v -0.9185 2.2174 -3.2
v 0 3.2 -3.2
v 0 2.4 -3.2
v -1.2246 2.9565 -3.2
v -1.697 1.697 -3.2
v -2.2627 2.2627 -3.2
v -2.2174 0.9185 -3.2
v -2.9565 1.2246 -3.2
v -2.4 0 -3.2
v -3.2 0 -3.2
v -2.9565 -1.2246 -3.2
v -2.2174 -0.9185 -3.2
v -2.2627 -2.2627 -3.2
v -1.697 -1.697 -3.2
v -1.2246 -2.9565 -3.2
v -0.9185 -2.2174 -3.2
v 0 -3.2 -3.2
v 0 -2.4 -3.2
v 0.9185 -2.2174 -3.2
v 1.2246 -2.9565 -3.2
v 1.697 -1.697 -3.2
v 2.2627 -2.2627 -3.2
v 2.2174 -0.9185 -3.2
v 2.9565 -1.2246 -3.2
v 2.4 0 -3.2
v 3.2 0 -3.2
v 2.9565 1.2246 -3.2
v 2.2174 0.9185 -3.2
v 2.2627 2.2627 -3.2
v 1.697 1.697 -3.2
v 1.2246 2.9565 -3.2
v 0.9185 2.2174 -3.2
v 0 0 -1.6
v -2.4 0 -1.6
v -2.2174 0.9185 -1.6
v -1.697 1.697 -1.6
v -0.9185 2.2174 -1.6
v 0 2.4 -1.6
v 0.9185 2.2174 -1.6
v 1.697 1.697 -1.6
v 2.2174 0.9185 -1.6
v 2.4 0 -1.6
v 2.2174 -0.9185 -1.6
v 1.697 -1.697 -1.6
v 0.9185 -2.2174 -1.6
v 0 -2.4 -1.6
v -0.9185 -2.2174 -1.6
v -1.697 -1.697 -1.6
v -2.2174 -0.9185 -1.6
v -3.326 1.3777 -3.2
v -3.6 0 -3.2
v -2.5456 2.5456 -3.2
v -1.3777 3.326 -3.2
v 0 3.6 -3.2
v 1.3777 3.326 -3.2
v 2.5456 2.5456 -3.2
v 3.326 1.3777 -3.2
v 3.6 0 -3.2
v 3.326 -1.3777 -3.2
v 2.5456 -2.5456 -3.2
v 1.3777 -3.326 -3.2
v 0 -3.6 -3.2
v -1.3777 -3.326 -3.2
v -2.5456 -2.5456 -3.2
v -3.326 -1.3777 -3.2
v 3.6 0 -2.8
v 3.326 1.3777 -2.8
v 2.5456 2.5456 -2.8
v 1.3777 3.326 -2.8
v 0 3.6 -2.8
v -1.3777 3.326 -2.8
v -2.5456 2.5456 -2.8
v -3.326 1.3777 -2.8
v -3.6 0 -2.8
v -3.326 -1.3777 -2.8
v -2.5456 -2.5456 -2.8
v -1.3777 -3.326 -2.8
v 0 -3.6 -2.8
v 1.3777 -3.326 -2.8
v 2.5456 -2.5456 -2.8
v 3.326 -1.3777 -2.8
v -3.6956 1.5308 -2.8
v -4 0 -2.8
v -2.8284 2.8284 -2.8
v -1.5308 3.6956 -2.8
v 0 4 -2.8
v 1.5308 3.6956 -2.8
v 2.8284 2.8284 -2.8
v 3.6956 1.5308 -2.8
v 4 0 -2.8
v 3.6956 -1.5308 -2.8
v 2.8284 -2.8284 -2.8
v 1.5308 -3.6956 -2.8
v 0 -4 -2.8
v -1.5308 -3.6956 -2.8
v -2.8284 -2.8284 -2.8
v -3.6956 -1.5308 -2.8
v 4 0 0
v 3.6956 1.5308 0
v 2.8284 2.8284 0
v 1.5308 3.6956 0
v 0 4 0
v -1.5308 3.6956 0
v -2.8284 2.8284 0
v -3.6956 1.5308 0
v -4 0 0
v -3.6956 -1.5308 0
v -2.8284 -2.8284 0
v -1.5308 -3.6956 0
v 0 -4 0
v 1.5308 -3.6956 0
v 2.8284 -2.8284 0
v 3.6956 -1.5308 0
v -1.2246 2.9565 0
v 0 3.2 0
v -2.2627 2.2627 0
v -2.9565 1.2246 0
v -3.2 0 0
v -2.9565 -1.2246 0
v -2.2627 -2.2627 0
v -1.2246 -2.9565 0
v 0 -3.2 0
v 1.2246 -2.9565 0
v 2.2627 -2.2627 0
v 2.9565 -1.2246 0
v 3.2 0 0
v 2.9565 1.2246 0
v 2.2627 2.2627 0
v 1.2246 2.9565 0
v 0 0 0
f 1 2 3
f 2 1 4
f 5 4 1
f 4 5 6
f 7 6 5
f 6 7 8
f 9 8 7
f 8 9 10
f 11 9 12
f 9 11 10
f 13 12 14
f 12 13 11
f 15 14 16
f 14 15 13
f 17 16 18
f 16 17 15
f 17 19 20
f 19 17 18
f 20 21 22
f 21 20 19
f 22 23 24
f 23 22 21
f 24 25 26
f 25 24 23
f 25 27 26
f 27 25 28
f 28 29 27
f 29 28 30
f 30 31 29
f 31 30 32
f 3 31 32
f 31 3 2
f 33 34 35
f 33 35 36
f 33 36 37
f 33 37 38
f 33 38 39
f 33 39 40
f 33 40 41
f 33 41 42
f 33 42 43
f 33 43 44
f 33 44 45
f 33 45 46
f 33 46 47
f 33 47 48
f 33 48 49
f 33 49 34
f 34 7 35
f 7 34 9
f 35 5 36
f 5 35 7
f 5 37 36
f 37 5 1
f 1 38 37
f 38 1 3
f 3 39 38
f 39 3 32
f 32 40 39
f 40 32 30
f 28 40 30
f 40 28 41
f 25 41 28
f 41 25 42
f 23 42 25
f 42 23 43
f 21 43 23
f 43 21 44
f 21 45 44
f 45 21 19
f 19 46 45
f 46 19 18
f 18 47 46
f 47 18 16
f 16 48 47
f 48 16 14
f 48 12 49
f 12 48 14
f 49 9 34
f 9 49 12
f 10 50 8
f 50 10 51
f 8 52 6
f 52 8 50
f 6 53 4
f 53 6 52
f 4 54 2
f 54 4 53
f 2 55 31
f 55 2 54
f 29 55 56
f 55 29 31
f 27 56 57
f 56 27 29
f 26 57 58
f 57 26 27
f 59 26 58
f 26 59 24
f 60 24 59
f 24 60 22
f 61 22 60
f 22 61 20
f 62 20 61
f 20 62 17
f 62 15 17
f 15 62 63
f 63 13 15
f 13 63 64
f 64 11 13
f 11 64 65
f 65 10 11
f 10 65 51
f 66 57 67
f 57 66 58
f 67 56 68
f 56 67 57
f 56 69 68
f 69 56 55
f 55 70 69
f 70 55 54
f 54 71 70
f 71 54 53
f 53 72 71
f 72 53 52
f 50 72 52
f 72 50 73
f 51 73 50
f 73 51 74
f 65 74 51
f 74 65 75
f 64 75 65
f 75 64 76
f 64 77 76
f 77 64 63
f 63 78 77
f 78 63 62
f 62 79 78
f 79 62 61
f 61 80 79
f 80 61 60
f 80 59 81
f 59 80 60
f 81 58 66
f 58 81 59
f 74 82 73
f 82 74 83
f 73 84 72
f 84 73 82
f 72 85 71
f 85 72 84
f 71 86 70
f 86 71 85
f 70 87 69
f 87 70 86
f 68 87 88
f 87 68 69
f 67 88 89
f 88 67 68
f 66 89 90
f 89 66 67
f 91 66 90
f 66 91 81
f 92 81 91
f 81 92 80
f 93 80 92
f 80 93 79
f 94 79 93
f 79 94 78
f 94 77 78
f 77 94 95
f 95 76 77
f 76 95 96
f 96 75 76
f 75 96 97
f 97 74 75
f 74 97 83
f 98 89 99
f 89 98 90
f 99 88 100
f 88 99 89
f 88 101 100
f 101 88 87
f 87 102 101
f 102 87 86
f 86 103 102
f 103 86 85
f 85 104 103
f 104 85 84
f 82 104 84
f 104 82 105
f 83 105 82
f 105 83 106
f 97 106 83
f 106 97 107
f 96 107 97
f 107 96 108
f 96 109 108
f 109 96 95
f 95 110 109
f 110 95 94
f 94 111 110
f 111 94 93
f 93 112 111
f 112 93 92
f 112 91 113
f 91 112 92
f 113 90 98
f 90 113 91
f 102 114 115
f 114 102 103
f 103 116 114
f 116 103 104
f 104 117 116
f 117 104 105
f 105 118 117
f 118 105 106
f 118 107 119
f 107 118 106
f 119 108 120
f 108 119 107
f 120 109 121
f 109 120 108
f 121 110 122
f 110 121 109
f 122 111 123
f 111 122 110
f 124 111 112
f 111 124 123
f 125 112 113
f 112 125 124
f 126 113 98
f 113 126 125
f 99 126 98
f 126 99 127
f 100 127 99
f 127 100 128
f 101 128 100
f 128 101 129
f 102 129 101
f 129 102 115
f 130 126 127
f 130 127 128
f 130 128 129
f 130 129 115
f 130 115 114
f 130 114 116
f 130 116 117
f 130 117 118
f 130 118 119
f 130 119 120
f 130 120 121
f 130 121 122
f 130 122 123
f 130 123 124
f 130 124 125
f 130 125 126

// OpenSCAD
// file: ../p/4-4ring3.scad
use <../lib.scad>
function ldraw_lib__4_4ring3() = [
// 0 Ring  3 x 1.0
// 0 Name: 4-4ring3.dat
// 0 Author: James Jessiman
// 0 !LDRAW_ORG Primitive UPDATE 2009-01
// 0 !LICENSE Licensed under CC BY 2.0 and CC BY 4.0 : see CAreadme.txt
// 
// 0 BFC CERTIFY CCW
  [0,"BFC","CERTIFY"],
  [0,"BFC","CCW"],
// 
// 0 !HISTORY 1998-12-15 [PTadmin] Official Update 1998-10
// 0 !HISTORY 2002-04-05 [hafhead] Added BFC statement
// 0 !HISTORY 2002-04-25 [PTadmin] Official Update 2002-02
// 0 !HISTORY 2007-06-24 [PTadmin] Header formatted for Contributor Agreement
// 0 !HISTORY 2008-07-01 [PTadmin] Official Update 2008-01
// 0 !HISTORY 2008-08-26 [cwdee] Switch polygon winding and rename
// 0 !HISTORY 2009-05-02 [PTadmin] Official Update 2009-01
// 
// 
// 4 16 -1.5308 0 3.6956 -1.1481 0 2.7717 0 0 3 0 0 4
  [4,16,-1.5308,0,3.6956,-1.1481,0,2.7717,0,0,3,0,0,4],
// 4 16 -2.8284 0 2.8284 -2.1213 0 2.1213 -1.1481 0 2.7717 -1.5308 0 3.6956
  [4,16,-2.8284,0,2.8284,-2.1213,0,2.1213,-1.1481,0,2.7717,-1.5308,0,3.6956],
// 4 16 -3.6956 0 1.5308 -2.7717 0 1.1481 -2.1213 0 2.1213 -2.8284 0 2.8284
  [4,16,-3.6956,0,1.5308,-2.7717,0,1.1481,-2.1213,0,2.1213,-2.8284,0,2.8284],
// 4 16 -4 0 0 -3 0 0 -2.7717 0 1.1481 -3.6956 0 1.5308
  [4,16,-4,0,0,-3,0,0,-2.7717,0,1.1481,-3.6956,0,1.5308],
// 4 16 -3.6956 0 -1.5308 -2.7717 0 -1.1481 -3 0 0 -4 0 0
  [4,16,-3.6956,0,-1.5308,-2.7717,0,-1.1481,-3,0,0,-4,0,0],
// 4 16 -2.8284 0 -2.8284 -2.1213 0 -2.1213 -2.7717 0 -1.1481 -3.6956 0 -1.5308
  [4,16,-2.8284,0,-2.8284,-2.1213,0,-2.1213,-2.7717,0,-1.1481,-3.6956,0,-1.5308],
// 4 16 -1.5308 0 -3.6956 -1.1481 0 -2.7717 -2.1213 0 -2.1213 -2.8284 0 -2.8284
  [4,16,-1.5308,0,-3.6956,-1.1481,0,-2.7717,-2.1213,0,-2.1213,-2.8284,0,-2.8284],
// 4 16 0 0 -4 0 0 -3 -1.1481 0 -2.7717 -1.5308 0 -3.6956
  [4,16,0,0,-4,0,0,-3,-1.1481,0,-2.7717,-1.5308,0,-3.6956],
// 4 16 1.5308 0 -3.6956 1.1481 0 -2.7717 0 0 -3 0 0 -4
  [4,16,1.5308,0,-3.6956,1.1481,0,-2.7717,0,0,-3,0,0,-4],
// 4 16 2.8284 0 -2.8284 2.1213 0 -2.1213 1.1481 0 -2.7717 1.5308 0 -3.6956
  [4,16,2.8284,0,-2.8284,2.1213,0,-2.1213,1.1481,0,-2.7717,1.5308,0,-3.6956],
// 4 16 3.6956 0 -1.5308 2.7717 0 -1.1481 2.1213 0 -2.1213 2.8284 0 -2.8284
  [4,16,3.6956,0,-1.5308,2.7717,0,-1.1481,2.1213,0,-2.1213,2.8284,0,-2.8284],
// 4 16 4 0 0 3 0 0 2.7717 0 -1.1481 3.6956 0 -1.5308
  [4,16,4,0,0,3,0,0,2.7717,0,-1.1481,3.6956,0,-1.5308],
// 4 16 3.6956 0 1.5308 2.7717 0 1.1481 3 0 0 4 0 0
  [4,16,3.6956,0,1.5308,2.7717,0,1.1481,3,0,0,4,0,0],
// 4 16 2.8284 0 2.8284 2.1213 0 2.1213 2.7717 0 1.1481 3.6956 0 1.5308
  [4,16,2.8284,0,2.8284,2.1213,0,2.1213,2.7717,0,1.1481,3.6956,0,1.5308],
// 4 16 1.5308 0 3.6956 1.1481 0 2.7717 2.1213 0 2.1213 2.8284 0 2.8284
  [4,16,1.5308,0,3.6956,1.1481,0,2.7717,2.1213,0,2.1213,2.8284,0,2.8284],
// 4 16 0 0 4 0 0 3 1.1481 0 2.7717 1.5308 0 3.6956
  [4,16,0,0,4,0,0,3,1.1481,0,2.7717,1.5308,0,3.6956],
// 0
];
module ldraw_lib__4_4ring3(step=0, col=false, unit=2/5, alt=false, line=0.2, solid=!$preview)
    makepoly(ldraw_lib__4_4ring3(), step=step, col=col, unit=unit, alt=alt, line=line, solid=solid);
ldraw_lib__4_4ring3(line=0.2);
// file: ../p/4-4cylc.scad
use <../lib.scad>
use <4-4cyli.scad>
use <4-4disc.scad>
use <4-4edge.scad>
function ldraw_lib__4_4cylc() = [
// 0 Cylinder Closed 1.0
// 0 Name: 4-4cylc.dat
// 0 Author: Alex Taylor [anathema]
// 0 !LDRAW_ORG Primitive UPDATE 2009-02
// 0 !LICENSE Licensed under CC BY 2.0 and CC BY 4.0 : see CAreadme.txt
// 
// 0 BFC CERTIFY CCW
  [0,"BFC","CERTIFY"],
  [0,"BFC","CCW"],
// 
// 0 !HISTORY 2008-12-29 [cwdee] Removed one disc
// 0 !HISTORY 2009-09-03 [PTadmin] Official Update 2009-02
// 
// 
// 1 16 0 0 0 1 0 0 0 1 0 0 0 1 4-4edge.dat
  [1,16,0,0,0,1,0,0,0,1,0,0,0,1, ldraw_lib__4_4edge()],
// 1 16 0 1 0 1 0 0 0 1 0 0 0 1 4-4edge.dat
  [1,16,0,1,0,1,0,0,0,1,0,0,0,1, ldraw_lib__4_4edge()],
// 1 16 0 0 0 1 0 0 0 1 0 0 0 1 4-4disc.dat
  [1,16,0,0,0,1,0,0,0,1,0,0,0,1, ldraw_lib__4_4disc()],
// 1 16 0 0 0 1 0 0 0 1 0 0 0 1 4-4cyli.dat
  [1,16,0,0,0,1,0,0,0,1,0,0,0,1, ldraw_lib__4_4cyli()],
// 0
];
module ldraw_lib__4_4cylc(step=0, col=false, unit=2/5, alt=false, line=0.2, solid=!$preview)
    makepoly(ldraw_lib__4_4cylc(), step=step, col=col, unit=unit, alt=alt, line=line, solid=solid);
ldraw_lib__4_4cylc(line=0.2);
// file: ../p/4-4edge.scad
use <../lib.scad>
function ldraw_lib__4_4edge() = [
// 0 Circle 1.0
// 0 Name: 4-4edge.dat
// 0 Author: James Jessiman
// 0 !LDRAW_ORG Primitive UPDATE 2017-01
// 0 !LICENSE Licensed under CC BY 4.0 : see CAreadme.txt
// 
// 0 BFC CERTIFY CCW
  [0,"BFC","CERTIFY"],
  [0,"BFC","CCW"],
// 
// 0 !HISTORY 1998-12-15 [PTadmin] Official Update 1998-10
// 0 !HISTORY 2005-12-28 [PTadmin] Official Update 2005-01
// 0 !HISTORY 2007-06-24 [PTadmin] Header formatted for Contributor Agreement
// 0 !HISTORY 2008-07-01 [PTadmin] Official Update 2008-01
// 0 !HISTORY 2017-01-15 [Steffen] BFCed
// 0 !HISTORY 2017-12-30 [PTadmin] Official Update 2017-01
// 
// 
// 2 24 1 0 0 0.9239 0 0.3827
  [2,24,1,0,0,0.9239,0,0.3827],
// 2 24 0.9239 0 0.3827 0.7071 0 0.7071
  [2,24,0.9239,0,0.3827,0.7071,0,0.7071],
// 2 24 0.7071 0 0.7071 0.3827 0 0.9239
  [2,24,0.7071,0,0.7071,0.3827,0,0.9239],
// 2 24 0.3827 0 0.9239 0 0 1
  [2,24,0.3827,0,0.9239,0,0,1],
// 2 24 0 0 1 -0.3827 0 0.9239
  [2,24,0,0,1,-0.3827,0,0.9239],
// 2 24 -0.3827 0 0.9239 -0.7071 0 0.7071
  [2,24,-0.3827,0,0.9239,-0.7071,0,0.7071],
// 2 24 -0.7071 0 0.7071 -0.9239 0 0.3827
  [2,24,-0.7071,0,0.7071,-0.9239,0,0.3827],
// 2 24 -0.9239 0 0.3827 -1 0 -0
  [2,24,-0.9239,0,0.3827,-1,0,-0],
// 2 24 -1 0 -0 -0.9239 0 -0.3827
  [2,24,-1,0,-0,-0.9239,0,-0.3827],
// 2 24 -0.9239 0 -0.3827 -0.7071 0 -0.7071
  [2,24,-0.9239,0,-0.3827,-0.7071,0,-0.7071],
// 2 24 -0.7071 0 -0.7071 -0.3827 0 -0.9239
  [2,24,-0.7071,0,-0.7071,-0.3827,0,-0.9239],
// 2 24 -0.3827 0 -0.9239 0 0 -1
  [2,24,-0.3827,0,-0.9239,0,0,-1],
// 2 24 0 0 -1 0.3827 0 -0.9239
  [2,24,0,0,-1,0.3827,0,-0.9239],
// 2 24 0.3827 0 -0.9239 0.7071 0 -0.7071
  [2,24,0.3827,0,-0.9239,0.7071,0,-0.7071],
// 2 24 0.7071 0 -0.7071 0.9239 0 -0.3827
  [2,24,0.7071,0,-0.7071,0.9239,0,-0.3827],
// 2 24 0.9239 0 -0.3827 1 0 0
  [2,24,0.9239,0,-0.3827,1,0,0],
];
module ldraw_lib__4_4edge(step=0, col=false, unit=2/5, alt=false, line=0.2, solid=!$preview)
    makepoly(ldraw_lib__4_4edge(), step=step, col=col, unit=unit, alt=alt, line=line, solid=solid);
ldraw_lib__4_4edge(line=0.2);
// file: ../p/4-4cyli.scad
use <../lib.scad>
function ldraw_lib__4_4cyli() = [
// 0 Cylinder 1.0
// 0 Name: 4-4cyli.dat
// 0 Author: James Jessiman
// 0 !LDRAW_ORG Primitive UPDATE 2005-01
// 0 !LICENSE Licensed under CC BY 2.0 and CC BY 4.0 : see CAreadme.txt
// 
// 0 BFC CERTIFY CCW
  [0,"BFC","CERTIFY"],
  [0,"BFC","CCW"],
// 
// 0 !HISTORY 1998-12-15 [PTadmin] Official Update 1998-10
// 0 !HISTORY 2002-03-23 [sbliss] Added BFC statement; merged headers from files in distributions LDraw 0.27 and Complete.
// 0 !HISTORY 2002-04-25 [PTadmin] Official Update 2002-02
// 0 !HISTORY 2004-12-14 [guyvivan] BFC CCW
// 0 !HISTORY 2005-12-28 [PTadmin] Official Update 2005-01
// 0 !HISTORY 2007-06-24 [PTadmin] Header formatted for Contributor Agreement
// 0 !HISTORY 2008-07-01 [PTadmin] Official Update 2008-01
// 
// 
// 4 16 1 1 0 0.9239 1 0.3827 0.9239 0 0.3827 1 0 0
  [4,16,1,1,0,0.9239,1,0.3827,0.9239,0,0.3827,1,0,0],
// 5 24 1 0 0 1 1 0 0.9239 0 0.3827 0.9239 0 -0.3827
  [5,24,1,0,0,1,1,0,0.9239,0,0.3827,0.9239,0,-0.3827],
// 4 16 0.9239 1 0.3827 0.7071 1 0.7071 0.7071 0 0.7071 0.9239 0 0.3827
  [4,16,0.9239,1,0.3827,0.7071,1,0.7071,0.7071,0,0.7071,0.9239,0,0.3827],
// 5 24 0.9239 0 0.3827 0.9239 1 0.3827 0.7071 0 0.7071 1 0 0
  [5,24,0.9239,0,0.3827,0.9239,1,0.3827,0.7071,0,0.7071,1,0,0],
// 4 16 0.7071 1 0.7071 0.3827 1 0.9239 0.3827 0 0.9239 0.7071 0 0.7071
  [4,16,0.7071,1,0.7071,0.3827,1,0.9239,0.3827,0,0.9239,0.7071,0,0.7071],
// 5 24 0.7071 0 0.7071 0.7071 1 0.7071 0.3827 0 0.9239 0.9239 0 0.3827
  [5,24,0.7071,0,0.7071,0.7071,1,0.7071,0.3827,0,0.9239,0.9239,0,0.3827],
// 4 16 0.3827 1 0.9239 0 1 1 0 0 1 0.3827 0 0.9239
  [4,16,0.3827,1,0.9239,0,1,1,0,0,1,0.3827,0,0.9239],
// 5 24 0.3827 0 0.9239 0.3827 1 0.9239 0 0 1 0.7071 0 0.7071
  [5,24,0.3827,0,0.9239,0.3827,1,0.9239,0,0,1,0.7071,0,0.7071],
// 4 16 0 1 1 -0.3827 1 0.9239 -0.3827 0 0.9239 0 0 1
  [4,16,0,1,1,-0.3827,1,0.9239,-0.3827,0,0.9239,0,0,1],
// 5 24 0 0 1 0 1 1 -0.3827 0 0.9239 0.3827 0 0.9239
  [5,24,0,0,1,0,1,1,-0.3827,0,0.9239,0.3827,0,0.9239],
// 4 16 -0.3827 1 0.9239 -0.7071 1 0.7071 -0.7071 0 0.7071 -0.3827 0 0.9239
  [4,16,-0.3827,1,0.9239,-0.7071,1,0.7071,-0.7071,0,0.7071,-0.3827,0,0.9239],
// 5 24 -0.3827 0 0.9239 -0.3827 1 0.9239 -0.7071 0 0.7071 0 0 1
  [5,24,-0.3827,0,0.9239,-0.3827,1,0.9239,-0.7071,0,0.7071,0,0,1],
// 4 16 -0.7071 1 0.7071 -0.9239 1 0.3827 -0.9239 0 0.3827 -0.7071 0 0.7071
  [4,16,-0.7071,1,0.7071,-0.9239,1,0.3827,-0.9239,0,0.3827,-0.7071,0,0.7071],
// 5 24 -0.7071 0 0.7071 -0.7071 1 0.7071 -0.9239 0 0.3827 -0.3827 0 0.9239
  [5,24,-0.7071,0,0.7071,-0.7071,1,0.7071,-0.9239,0,0.3827,-0.3827,0,0.9239],
// 4 16 -0.9239 1 0.3827 -1 1 0 -1 0 0 -0.9239 0 0.3827
  [4,16,-0.9239,1,0.3827,-1,1,0,-1,0,0,-0.9239,0,0.3827],
// 5 24 -0.9239 0 0.3827 -0.9239 1 0.3827 -1 0 0 -0.7071 0 0.7071
  [5,24,-0.9239,0,0.3827,-0.9239,1,0.3827,-1,0,0,-0.7071,0,0.7071],
// 4 16 -1 1 0 -0.9239 1 -0.3827 -0.9239 0 -0.3827 -1 0 0
  [4,16,-1,1,0,-0.9239,1,-0.3827,-0.9239,0,-0.3827,-1,0,0],
// 5 24 -1 0 0 -1 1 0 -0.9239 0 -0.3827 -0.9239 0 0.3827
  [5,24,-1,0,0,-1,1,0,-0.9239,0,-0.3827,-0.9239,0,0.3827],
// 4 16 -0.9239 1 -0.3827 -0.7071 1 -0.7071 -0.7071 0 -0.7071 -0.9239 0 -0.3827
  [4,16,-0.9239,1,-0.3827,-0.7071,1,-0.7071,-0.7071,0,-0.7071,-0.9239,0,-0.3827],
// 5 24 -0.9239 0 -0.3827 -0.9239 1 -0.3827 -0.7071 0 -0.7071 -1 0 0
  [5,24,-0.9239,0,-0.3827,-0.9239,1,-0.3827,-0.7071,0,-0.7071,-1,0,0],
// 4 16 -0.7071 1 -0.7071 -0.3827 1 -0.9239 -0.3827 0 -0.9239 -0.7071 0 -0.7071
  [4,16,-0.7071,1,-0.7071,-0.3827,1,-0.9239,-0.3827,0,-0.9239,-0.7071,0,-0.7071],
// 5 24 -0.7071 0 -0.7071 -0.7071 1 -0.7071 -0.3827 0 -0.9239 -0.9239 0 -0.3827
  [5,24,-0.7071,0,-0.7071,-0.7071,1,-0.7071,-0.3827,0,-0.9239,-0.9239,0,-0.3827],
// 4 16 -0.3827 1 -0.9239 0 1 -1 0 0 -1 -0.3827 0 -0.9239
  [4,16,-0.3827,1,-0.9239,0,1,-1,0,0,-1,-0.3827,0,-0.9239],
// 5 24 -0.3827 0 -0.9239 -0.3827 1 -0.9239 0 0 -1 -0.7071 0 -0.7071
  [5,24,-0.3827,0,-0.9239,-0.3827,1,-0.9239,0,0,-1,-0.7071,0,-0.7071],
// 4 16 0 1 -1 0.3827 1 -0.9239 0.3827 0 -0.9239 0 0 -1
  [4,16,0,1,-1,0.3827,1,-0.9239,0.3827,0,-0.9239,0,0,-1],
// 5 24 0 0 -1 0 1 -1 0.3827 0 -0.9239 -0.3827 0 -0.9239
  [5,24,0,0,-1,0,1,-1,0.3827,0,-0.9239,-0.3827,0,-0.9239],
// 4 16 0.3827 1 -0.9239 0.7071 1 -0.7071 0.7071 0 -0.7071 0.3827 0 -0.9239
  [4,16,0.3827,1,-0.9239,0.7071,1,-0.7071,0.7071,0,-0.7071,0.3827,0,-0.9239],
// 5 24 0.3827 0 -0.9239 0.3827 1 -0.9239 0.7071 0 -0.7071 0 0 -1
  [5,24,0.3827,0,-0.9239,0.3827,1,-0.9239,0.7071,0,-0.7071,0,0,-1],
// 4 16 0.7071 1 -0.7071 0.9239 1 -0.3827 0.9239 0 -0.3827 0.7071 0 -0.7071
  [4,16,0.7071,1,-0.7071,0.9239,1,-0.3827,0.9239,0,-0.3827,0.7071,0,-0.7071],
// 5 24 0.7071 0 -0.7071 0.7071 1 -0.7071 0.9239 0 -0.3827 0.3827 0 -0.9239
  [5,24,0.7071,0,-0.7071,0.7071,1,-0.7071,0.9239,0,-0.3827,0.3827,0,-0.9239],
// 4 16 0.9239 1 -0.3827 1 1 0 1 0 0 0.9239 0 -0.3827
  [4,16,0.9239,1,-0.3827,1,1,0,1,0,0,0.9239,0,-0.3827],
// 5 24 0.9239 0 -0.3827 0.9239 1 -0.3827 1 0 0 0.7071 0 -0.7071
  [5,24,0.9239,0,-0.3827,0.9239,1,-0.3827,1,0,0,0.7071,0,-0.7071],
// 0
];
module ldraw_lib__4_4cyli(step=0, col=false, unit=2/5, alt=false, line=0.2, solid=!$preview)
    makepoly(ldraw_lib__4_4cyli(), step=step, col=col, unit=unit, alt=alt, line=line, solid=solid);
ldraw_lib__4_4cyli(line=0.2);
// file: ../p/stud4o.scad
use <../lib.scad>
use <4-4cylc.scad>
use <4-4ring3.scad>
function ldraw_lib__stud4o() = [
// 0 Stud Tube Open without Outer Cylinder
// 0 Name: stud4o.dat
// 0 Author: Magnus Forsberg [MagFors]
// 0 !LDRAW_ORG Primitive UPDATE 2011-02
// 0 !LICENSE Licensed under CC BY 4.0 : see CAreadme.txt
// 
// 0 !HELP This stud is a "antistud" to be used like a underside stud,
// 0 !HELP but without the outer cylinder.
// 0 !HELP 1 47 0 0 0 1 0 0 0 1 0 0 0 1 stud4.dat
// 
// 0 BFC CERTIFY CCW
  [0,"BFC","CERTIFY"],
  [0,"BFC","CCW"],
// 
// 0 !HISTORY 2011-12-29 [PTadmin] Official Update 2011-02
// 
// 
// 1 16 0 -4 0 2 0 0 0 1 0 0 0 2 4-4ring3.dat
  [1,16,0,-4,0,2,0,0,0,1,0,0,0,2, ldraw_lib__4_4ring3()],
// 0 BFC INVERTNEXT
  [0,"BFC","INVERTNEXT"],
// 1 16 0 0 0 -6 0 0 0 -4 0 0 0 6 4-4cylc.dat
  [1,16,0,0,0,-6,0,0,0,-4,0,0,0,6, ldraw_lib__4_4cylc()],
];
module ldraw_lib__stud4o(step=0, col=false, unit=2/5, alt=false, line=0.2, solid=!$preview)
    makepoly(ldraw_lib__stud4o(), step=step, col=col, unit=unit, alt=alt, line=line, solid=solid);
ldraw_lib__stud4o(line=0.2);
// file: ../p/4-4ring9.scad
use <../lib.scad>
function ldraw_lib__4_4ring9() = [
// 0 Ring  9 x 1.0
// 0 Name: 4-4ring9.dat
// 0 Author: John Riley [jriley]
// 0 !LDRAW_ORG Primitive UPDATE 2004-02
// 0 !LICENSE Licensed under CC BY 2.0 and CC BY 4.0 : see CAreadme.txt
// 
// 0 BFC CERTIFY CCW
  [0,"BFC","CERTIFY"],
  [0,"BFC","CCW"],
// 
// 0 !HISTORY 2004-04-22 [PTadmin] Official Update 2004-02
// 0 !HISTORY 2007-06-24 [PTadmin] Header formatted for Contributor Agreement
// 0 !HISTORY 2008-07-01 [PTadmin] Official Update 2008-01
// 
// 
// 4 16 9 0 0 10 0 0 9.239 0 3.827 8.3151 0 3.4443
  [4,16,9,0,0,10,0,0,9.239,0,3.827,8.3151,0,3.4443],
// 4 16 8.3151 0 3.4443 9.239 0 3.827 7.071 0 7.071 6.3639 0 6.3639
  [4,16,8.3151,0,3.4443,9.239,0,3.827,7.071,0,7.071,6.3639,0,6.3639],
// 4 16 6.3639 0 6.3639 7.071 0 7.071 3.827 0 9.239 3.4443 0 8.3151
  [4,16,6.3639,0,6.3639,7.071,0,7.071,3.827,0,9.239,3.4443,0,8.3151],
// 4 16 3.4443 0 8.3151 3.827 0 9.239 0 0 10 0 0 9
  [4,16,3.4443,0,8.3151,3.827,0,9.239,0,0,10,0,0,9],
// 4 16 0 0 9 0 0 10 -3.827 0 9.239 -3.4443 0 8.3151
  [4,16,0,0,9,0,0,10,-3.827,0,9.239,-3.4443,0,8.3151],
// 4 16 -3.4443 0 8.3151 -3.827 0 9.239 -7.071 0 7.071 -6.3639 0 6.3639
  [4,16,-3.4443,0,8.3151,-3.827,0,9.239,-7.071,0,7.071,-6.3639,0,6.3639],
// 4 16 -6.3639 0 6.3639 -7.071 0 7.071 -9.239 0 3.827 -8.3151 0 3.4443
  [4,16,-6.3639,0,6.3639,-7.071,0,7.071,-9.239,0,3.827,-8.3151,0,3.4443],
// 4 16 -8.3151 0 3.4443 -9.239 0 3.827 -10 0 0 -9 0 0
  [4,16,-8.3151,0,3.4443,-9.239,0,3.827,-10,0,0,-9,0,0],
// 4 16 -9 0 0 -10 0 0 -9.239 0 -3.827 -8.3151 0 -3.4443
  [4,16,-9,0,0,-10,0,0,-9.239,0,-3.827,-8.3151,0,-3.4443],
// 4 16 -8.3151 0 -3.4443 -9.239 0 -3.827 -7.071 0 -7.071 -6.3639 0 -6.3639
  [4,16,-8.3151,0,-3.4443,-9.239,0,-3.827,-7.071,0,-7.071,-6.3639,0,-6.3639],
// 4 16 -6.3639 0 -6.3639 -7.071 0 -7.071 -3.827 0 -9.239 -3.4443 0 -8.3151
  [4,16,-6.3639,0,-6.3639,-7.071,0,-7.071,-3.827,0,-9.239,-3.4443,0,-8.3151],
// 4 16 -3.4443 0 -8.3151 -3.827 0 -9.239 0 0 -10 0 0 -9
  [4,16,-3.4443,0,-8.3151,-3.827,0,-9.239,0,0,-10,0,0,-9],
// 4 16 0 0 -9 0 0 -10 3.827 0 -9.239 3.4443 0 -8.3151
  [4,16,0,0,-9,0,0,-10,3.827,0,-9.239,3.4443,0,-8.3151],
// 4 16 3.4443 0 -8.3151 3.827 0 -9.239 7.071 0 -7.071 6.3639 0 -6.3639
  [4,16,3.4443,0,-8.3151,3.827,0,-9.239,7.071,0,-7.071,6.3639,0,-6.3639],
// 4 16 6.3639 0 -6.3639 7.071 0 -7.071 9.239 0 -3.827 8.3151 0 -3.4443
  [4,16,6.3639,0,-6.3639,7.071,0,-7.071,9.239,0,-3.827,8.3151,0,-3.4443],
// 4 16 8.3151 0 -3.4443 9.239 0 -3.827 10 0 0 9 0 0
  [4,16,8.3151,0,-3.4443,9.239,0,-3.827,10,0,0,9,0,0],
// 0
];
module ldraw_lib__4_4ring9(step=0, col=false, unit=2/5, alt=false, line=0.2, solid=!$preview)
    makepoly(ldraw_lib__4_4ring9(), step=step, col=col, unit=unit, alt=alt, line=line, solid=solid);
ldraw_lib__4_4ring9(line=0.2);
// file: ../p/4-4ring8.scad
use <../lib.scad>
function ldraw_lib__4_4ring8() = [
// 0 Ring  8 x 1.0
// 0 Name: 4-4ring8.dat
// 0 Author: Steffen [Steffen]
// 0 !LDRAW_ORG Primitive UPDATE 2012-01
// 0 !LICENSE Licensed under CC BY 4.0 : see CAreadme.txt
// 
// 0 BFC CERTIFY CCW
  [0,"BFC","CERTIFY"],
  [0,"BFC","CCW"],
// 
// 0 !HISTORY 2003-12-19 [PTadmin] Official Update 2003-03
// 0 !HISTORY 2007-06-24 [PTadmin] Header formatted for Contributor Agreement
// 0 !HISTORY 2008-07-01 [PTadmin] Official Update 2008-01
// 0 !HISTORY 2012-02-16 [Philo] Changed to CCW
// 0 !HISTORY 2012-03-30 [PTadmin] Official Update 2012-01
// 
// 
// 4 16 9 0 0 8.3151 0 3.4443 7.3912 0 3.0616 8 0 0
  [4,16,9,0,0,8.3151,0,3.4443,7.3912,0,3.0616,8,0,0],
// 4 16 8.3151 0 3.4443 6.3639 0 6.3639 5.6568 0 5.6568 7.3912 0 3.0616
  [4,16,8.3151,0,3.4443,6.3639,0,6.3639,5.6568,0,5.6568,7.3912,0,3.0616],
// 4 16 6.3639 0 6.3639 3.4443 0 8.3151 3.0616 0 7.3912 5.6568 0 5.6568
  [4,16,6.3639,0,6.3639,3.4443,0,8.3151,3.0616,0,7.3912,5.6568,0,5.6568],
// 4 16 3.4443 0 8.3151 0 0 9 0 0 8 3.0616 0 7.3912
  [4,16,3.4443,0,8.3151,0,0,9,0,0,8,3.0616,0,7.3912],
// 4 16 0 0 9 -3.4443 0 8.3151 -3.0616 0 7.3912 0 0 8
  [4,16,0,0,9,-3.4443,0,8.3151,-3.0616,0,7.3912,0,0,8],
// 4 16 -3.4443 0 8.3151 -6.3639 0 6.3639 -5.6568 0 5.6568 -3.0616 0 7.3912
  [4,16,-3.4443,0,8.3151,-6.3639,0,6.3639,-5.6568,0,5.6568,-3.0616,0,7.3912],
// 4 16 -6.3639 0 6.3639 -8.3151 0 3.4443 -7.3912 0 3.0616 -5.6568 0 5.6568
  [4,16,-6.3639,0,6.3639,-8.3151,0,3.4443,-7.3912,0,3.0616,-5.6568,0,5.6568],
// 4 16 -8.3151 0 3.4443 -9 0 0 -8 0 0 -7.3912 0 3.0616
  [4,16,-8.3151,0,3.4443,-9,0,0,-8,0,0,-7.3912,0,3.0616],
// 4 16 -9 0 0 -8.3151 0 -3.4443 -7.3912 0 -3.0616 -8 0 0
  [4,16,-9,0,0,-8.3151,0,-3.4443,-7.3912,0,-3.0616,-8,0,0],
// 4 16 -8.3151 0 -3.4443 -6.3639 0 -6.3639 -5.6568 0 -5.6568 -7.3912 0 -3.0616
  [4,16,-8.3151,0,-3.4443,-6.3639,0,-6.3639,-5.6568,0,-5.6568,-7.3912,0,-3.0616],
// 4 16 -6.3639 0 -6.3639 -3.4443 0 -8.3151 -3.0616 0 -7.3912 -5.6568 0 -5.6568
  [4,16,-6.3639,0,-6.3639,-3.4443,0,-8.3151,-3.0616,0,-7.3912,-5.6568,0,-5.6568],
// 4 16 -3.4443 0 -8.3151 0 0 -9 0 0 -8 -3.0616 0 -7.3912
  [4,16,-3.4443,0,-8.3151,0,0,-9,0,0,-8,-3.0616,0,-7.3912],
// 4 16 0 0 -9 3.4443 0 -8.3151 3.0616 0 -7.3912 0 0 -8
  [4,16,0,0,-9,3.4443,0,-8.3151,3.0616,0,-7.3912,0,0,-8],
// 4 16 3.4443 0 -8.3151 6.3639 0 -6.3639 5.6568 0 -5.6568 3.0616 0 -7.3912
  [4,16,3.4443,0,-8.3151,6.3639,0,-6.3639,5.6568,0,-5.6568,3.0616,0,-7.3912],
// 4 16 6.3639 0 -6.3639 8.3151 0 -3.4443 7.3912 0 -3.0616 5.6568 0 -5.6568
  [4,16,6.3639,0,-6.3639,8.3151,0,-3.4443,7.3912,0,-3.0616,5.6568,0,-5.6568],
// 4 16 8.3151 0 -3.4443 9 0 0 8 0 0 7.3912 0 -3.0616
  [4,16,8.3151,0,-3.4443,9,0,0,8,0,0,7.3912,0,-3.0616],
];
module ldraw_lib__4_4ring8(step=0, col=false, unit=2/5, alt=false, line=0.2, solid=!$preview)
    makepoly(ldraw_lib__4_4ring8(), step=step, col=col, unit=unit, alt=alt, line=line, solid=solid);
ldraw_lib__4_4ring8(line=0.2);
// file: ../p/4-4cylo.scad
use <../lib.scad>
use <4-4cyli.scad>
use <4-4edge.scad>
function ldraw_lib__4_4cylo() = [
// 0 Cylinder Open 1.0
// 0 Name: 4-4cylo.dat
// 0 Author: Mark Kennedy [mkennedy]
// 0 !LDRAW_ORG Primitive UPDATE 2010-01
// 0 !LICENSE Licensed under CC BY 4.0 : see CAreadme.txt
// 
// 0 BFC CERTIFY CCW
  [0,"BFC","CERTIFY"],
  [0,"BFC","CCW"],
// 
// 0 !HISTORY 2010-04-05 [PTadmin] Official Update 2010-01
// 
// 
// 1 16 0 0 0 1 0 0 0 1 0 0 0 1 4-4edge.dat
  [1,16,0,0,0,1,0,0,0,1,0,0,0,1, ldraw_lib__4_4edge()],
// 1 16 0 1 0 1 0 0 0 1 0 0 0 1 4-4edge.dat
  [1,16,0,1,0,1,0,0,0,1,0,0,0,1, ldraw_lib__4_4edge()],
// 1 16 0 0 0 1 0 0 0 1 0 0 0 1 4-4cyli.dat
  [1,16,0,0,0,1,0,0,0,1,0,0,0,1, ldraw_lib__4_4cyli()],
// 0
];
module ldraw_lib__4_4cylo(step=0, col=false, unit=2/5, alt=false, line=0.2, solid=!$preview)
    makepoly(ldraw_lib__4_4cylo(), step=step, col=col, unit=unit, alt=alt, line=line, solid=solid);
ldraw_lib__4_4cylo(line=0.2);
// file: s/98138s02.scad
use <../../lib.scad>
use <../../p/4-4cylo.scad>
use <../../p/4-4ring8.scad>
use <../../p/4-4ring9.scad>
use <../../p/stud4o.scad>
function ldraw_lib__s__98138s02() = [
// 0 ~Tile  1 x  1 Round with Groove without Complete Top Face
// 0 Name: s\98138s02.dat
// 0 Author: Magnus Forsberg [MagFors]
// 0 !LDRAW_ORG Subpart UPDATE 2020-01
// 0 !LICENSE Licensed under CC BY 4.0 : see CAreadme.txt
// 
// 0 BFC CERTIFY CCW
  [0,"BFC","CERTIFY"],
  [0,"BFC","CCW"],
// 
// 0 !HISTORY 2020-06-28 [PTadmin] Official Update 2020-01
// 
// 
// 1 16 0 4 0 1 0 0 0 -1 0 0 0 1 stud4o.dat
  [1,16,0,4,0,1,0,0,0,-1,0,0,0,1, ldraw_lib__stud4o()],
// 1 16 0 8 0 -1 0 0 0 -1 0 0 0 1 4-4ring8.dat
  [1,16,0,8,0,-1,0,0,0,-1,0,0,0,1, ldraw_lib__4_4ring8()],
// 1 16 0 7 0 9 0 0 0 1 0 0 0 9 4-4cylo.dat
  [1,16,0,7,0,9,0,0,0,1,0,0,0,9, ldraw_lib__4_4cylo()],
// 1 16 0 7 0 -1 0 0 0 -1 0 0 0 1 4-4ring9.dat
  [1,16,0,7,0,-1,0,0,0,-1,0,0,0,1, ldraw_lib__4_4ring9()],
// 1 16 0 0 0 10 0 0 0 7 0 0 0 10 4-4cylo.dat
  [1,16,0,0,0,10,0,0,0,7,0,0,0,10, ldraw_lib__4_4cylo()],
];
module ldraw_lib__s__98138s02(step=0, col=false, unit=2/5, alt=false, line=0.2, solid=!$preview)
    makepoly(ldraw_lib__s__98138s02(), step=step, col=col, unit=unit, alt=alt, line=line, solid=solid);
ldraw_lib__s__98138s02(line=0.2);
// file: ../p/4-4ring4.scad
use <../lib.scad>
function ldraw_lib__4_4ring4() = [
// 0 Ring  4 x 1.0
// 0 Name: 4-4ring4.dat
// 0 Author: James Jessiman
// 0 !LDRAW_ORG Primitive UPDATE 2009-01
// 0 !LICENSE Licensed under CC BY 2.0 and CC BY 4.0 : see CAreadme.txt
// 
// 0 BFC CERTIFY CCW
  [0,"BFC","CERTIFY"],
  [0,"BFC","CCW"],
// 
// 0 !HISTORY 1998-12-15 [PTadmin] Official Update 1998-10
// 0 !HISTORY 2002-04-08 [BrickCaster] Modified for BFC compliance
// 0 !HISTORY 2002-04-25 [PTadmin] Official Update 2002-02
// 0 !HISTORY 2007-06-24 [PTadmin] Header formatted for Contributor Agreement
// 0 !HISTORY 2008-07-01 [PTadmin] Official Update 2008-01
// 0 !HISTORY 2008-08-26 [cwdee] Switch polygon winding and rename
// 0 !HISTORY 2009-05-02 [PTadmin] Official Update 2009-01
// 
// 
// 4 16 -1.9135 0 4.6195 -1.5308 0 3.6956 0 0 4 0 0 5
  [4,16,-1.9135,0,4.6195,-1.5308,0,3.6956,0,0,4,0,0,5],
// 4 16 -3.5355 0 3.5355 -2.8284 0 2.8284 -1.5308 0 3.6956 -1.9135 0 4.6195
  [4,16,-3.5355,0,3.5355,-2.8284,0,2.8284,-1.5308,0,3.6956,-1.9135,0,4.6195],
// 4 16 -4.6195 0 1.9135 -3.6956 0 1.5308 -2.8284 0 2.8284 -3.5355 0 3.5355
  [4,16,-4.6195,0,1.9135,-3.6956,0,1.5308,-2.8284,0,2.8284,-3.5355,0,3.5355],
// 4 16 -5 0 0 -4 0 0 -3.6956 0 1.5308 -4.6195 0 1.9135
  [4,16,-5,0,0,-4,0,0,-3.6956,0,1.5308,-4.6195,0,1.9135],
// 4 16 -4.6195 0 -1.9135 -3.6956 0 -1.5308 -4 0 0 -5 0 0
  [4,16,-4.6195,0,-1.9135,-3.6956,0,-1.5308,-4,0,0,-5,0,0],
// 4 16 -3.5355 0 -3.5355 -2.8284 0 -2.8284 -3.6956 0 -1.5308 -4.6195 0 -1.9135
  [4,16,-3.5355,0,-3.5355,-2.8284,0,-2.8284,-3.6956,0,-1.5308,-4.6195,0,-1.9135],
// 4 16 -1.9135 0 -4.6195 -1.5308 0 -3.6956 -2.8284 0 -2.8284 -3.5355 0 -3.5355
  [4,16,-1.9135,0,-4.6195,-1.5308,0,-3.6956,-2.8284,0,-2.8284,-3.5355,0,-3.5355],
// 4 16 0 0 -5 0 0 -4 -1.5308 0 -3.6956 -1.9135 0 -4.6195
  [4,16,0,0,-5,0,0,-4,-1.5308,0,-3.6956,-1.9135,0,-4.6195],
// 4 16 1.9135 0 -4.6195 1.5308 0 -3.6956 0 0 -4 0 0 -5
  [4,16,1.9135,0,-4.6195,1.5308,0,-3.6956,0,0,-4,0,0,-5],
// 4 16 3.5355 0 -3.5355 2.8284 0 -2.8284 1.5308 0 -3.6956 1.9135 0 -4.6195
  [4,16,3.5355,0,-3.5355,2.8284,0,-2.8284,1.5308,0,-3.6956,1.9135,0,-4.6195],
// 4 16 4.6195 0 -1.9135 3.6956 0 -1.5308 2.8284 0 -2.8284 3.5355 0 -3.5355
  [4,16,4.6195,0,-1.9135,3.6956,0,-1.5308,2.8284,0,-2.8284,3.5355,0,-3.5355],
// 4 16 5 0 0 4 0 0 3.6956 0 -1.5308 4.6195 0 -1.9135
  [4,16,5,0,0,4,0,0,3.6956,0,-1.5308,4.6195,0,-1.9135],
// 4 16 4.6195 0 1.9135 3.6956 0 1.5308 4 0 0 5 0 0
  [4,16,4.6195,0,1.9135,3.6956,0,1.5308,4,0,0,5,0,0],
// 4 16 3.5355 0 3.5355 2.8284 0 2.8284 3.6956 0 1.5308 4.6195 0 1.9135
  [4,16,3.5355,0,3.5355,2.8284,0,2.8284,3.6956,0,1.5308,4.6195,0,1.9135],
// 4 16 1.9135 0 4.6195 1.5308 0 3.6956 2.8284 0 2.8284 3.5355 0 3.5355
  [4,16,1.9135,0,4.6195,1.5308,0,3.6956,2.8284,0,2.8284,3.5355,0,3.5355],
// 4 16 0 0 5 0 0 4 1.5308 0 3.6956 1.9135 0 4.6195
  [4,16,0,0,5,0,0,4,1.5308,0,3.6956,1.9135,0,4.6195],
// 0
];
module ldraw_lib__4_4ring4(step=0, col=false, unit=2/5, alt=false, line=0.2, solid=!$preview)
    makepoly(ldraw_lib__4_4ring4(), step=step, col=col, unit=unit, alt=alt, line=line, solid=solid);
ldraw_lib__4_4ring4(line=0.2);
// file: ../p/4-4disc.scad
use <../lib.scad>
function ldraw_lib__4_4disc() = [
// 0 Disc 1.0
// 0 Name: 4-4disc.dat
// 0 Author: James Jessiman
// 0 !LDRAW_ORG Primitive UPDATE 2002-02
// 0 !LICENSE Licensed under CC BY 4.0 : see CAreadme.txt
// 
// 0 BFC CERTIFY CCW
  [0,"BFC","CERTIFY"],
  [0,"BFC","CCW"],
// 
// 0 !HISTORY 1998-12-15 [PTadmin] Official Update 1998-10
// 0 !HISTORY 2002-03-23 [sbliss] Added BFC statement
// 0 !HISTORY 2002-04-25 [PTadmin] Official Update 2002-02
// 0 !HISTORY 2007-06-24 [PTadmin] Header formatted for Contributor Agreement
// 0 !HISTORY 2008-07-01 [PTadmin] Official Update 2008-01
// 
// 
// 3 16 0 0 0 1 0 0 0.9239 0 0.3827
  [3,16,0,0,0,1,0,0,0.9239,0,0.3827],
// 3 16 0 0 0 0.9239 0 0.3827 0.7071 0 0.7071
  [3,16,0,0,0,0.9239,0,0.3827,0.7071,0,0.7071],
// 3 16 0 0 0 0.7071 0 0.7071 0.3827 0 0.9239
  [3,16,0,0,0,0.7071,0,0.7071,0.3827,0,0.9239],
// 3 16 0 0 0 0.3827 0 0.9239 0 0 1
  [3,16,0,0,0,0.3827,0,0.9239,0,0,1],
// 3 16 0 0 0 0 0 1 -0.3827 0 0.9239
  [3,16,0,0,0,0,0,1,-0.3827,0,0.9239],
// 3 16 0 0 0 -0.3827 0 0.9239 -0.7071 0 0.7071
  [3,16,0,0,0,-0.3827,0,0.9239,-0.7071,0,0.7071],
// 3 16 0 0 0 -0.7071 0 0.7071 -0.9239 0 0.3827
  [3,16,0,0,0,-0.7071,0,0.7071,-0.9239,0,0.3827],
// 3 16 0 0 0 -0.9239 0 0.3827 -1 0 -0
  [3,16,0,0,0,-0.9239,0,0.3827,-1,0,-0],
// 3 16 0 0 0 -1 0 -0 -0.9239 0 -0.3827
  [3,16,0,0,0,-1,0,-0,-0.9239,0,-0.3827],
// 3 16 0 0 0 -0.9239 0 -0.3827 -0.7071 0 -0.7071
  [3,16,0,0,0,-0.9239,0,-0.3827,-0.7071,0,-0.7071],
// 3 16 0 0 0 -0.7071 0 -0.7071 -0.3827 0 -0.9239
  [3,16,0,0,0,-0.7071,0,-0.7071,-0.3827,0,-0.9239],
// 3 16 0 0 0 -0.3827 0 -0.9239 0 0 -1
  [3,16,0,0,0,-0.3827,0,-0.9239,0,0,-1],
// 3 16 0 0 0 0 0 -1 0.3827 0 -0.9239
  [3,16,0,0,0,0,0,-1,0.3827,0,-0.9239],
// 3 16 0 0 0 0.3827 0 -0.9239 0.7071 0 -0.7071
  [3,16,0,0,0,0.3827,0,-0.9239,0.7071,0,-0.7071],
// 3 16 0 0 0 0.7071 0 -0.7071 0.9239 0 -0.3827
  [3,16,0,0,0,0.7071,0,-0.7071,0.9239,0,-0.3827],
// 3 16 0 0 0 0.9239 0 -0.3827 1 0 0
  [3,16,0,0,0,0.9239,0,-0.3827,1,0,0],
// 0
];
module ldraw_lib__4_4disc(step=0, col=false, unit=2/5, alt=false, line=0.2, solid=!$preview)
    makepoly(ldraw_lib__4_4disc(), step=step, col=col, unit=unit, alt=alt, line=line, solid=solid);
ldraw_lib__4_4disc(line=0.2);
// main file
use <../lib.scad>
use <../p/4-4disc.scad>
use <../p/4-4ring4.scad>
use <s/98138s02.scad>
function ldraw_lib__98138py0() = [
// 0 Tile  1 x  1 Round with Black Disc Pattern
// 0 Name: 98138py0.dat
// 0 Author: Massimo Maso [Sirio]
// 0 !LDRAW_ORG Part UPDATE 2023-02
// 0 !LICENSE Licensed under CC BY 4.0 : see CAreadme.txt
// 
// 0 BFC CERTIFY CCW
  [0,"BFC","CERTIFY"],
  [0,"BFC","CCW"],
// 
// 0 !KEYWORDS Bricklink 98138pb369, Competizione, Ferrari, Rebrickable 98138pr0349
// 0 !KEYWORDS Set 76914, Speed Champions, 812
// 
// 0 !HISTORY 2023-04-17 [OrionP] Official Update 2023-02
// 
// 
// 0 // Subpart
// 1 16 0 0 0 1 0 0 0 1 0 0 0 1 s\98138s02.dat
  [1,16,0,0,0,1,0,0,0,1,0,0,0,1, ldraw_lib__s__98138s02()],
// 0 // Primitives
// 1 16 0 0 0 2 0 0 0 1 0 0 0 2 4-4ring4.dat
  [1,16,0,0,0,2,0,0,0,1,0,0,0,2, ldraw_lib__4_4ring4()],
// 0 BFC NOCLIP
  [0,"BFC","NOCLIP"],
// 1 0 0 0 0 8 0 0 0 1 0 0 0 8 4-4disc.dat
  [1,0,0,0,0,8,0,0,0,1,0,0,0,8, ldraw_lib__4_4disc()],
];
module ldraw_lib__98138py0(step=0, col=false, unit=2/5, alt=false, line=0.2, solid=!$preview)
    makepoly(ldraw_lib__98138py0(), step=step, col=col, unit=unit, alt=alt, line=line, solid=solid);
ldraw_lib__98138py0(line=0.2);
